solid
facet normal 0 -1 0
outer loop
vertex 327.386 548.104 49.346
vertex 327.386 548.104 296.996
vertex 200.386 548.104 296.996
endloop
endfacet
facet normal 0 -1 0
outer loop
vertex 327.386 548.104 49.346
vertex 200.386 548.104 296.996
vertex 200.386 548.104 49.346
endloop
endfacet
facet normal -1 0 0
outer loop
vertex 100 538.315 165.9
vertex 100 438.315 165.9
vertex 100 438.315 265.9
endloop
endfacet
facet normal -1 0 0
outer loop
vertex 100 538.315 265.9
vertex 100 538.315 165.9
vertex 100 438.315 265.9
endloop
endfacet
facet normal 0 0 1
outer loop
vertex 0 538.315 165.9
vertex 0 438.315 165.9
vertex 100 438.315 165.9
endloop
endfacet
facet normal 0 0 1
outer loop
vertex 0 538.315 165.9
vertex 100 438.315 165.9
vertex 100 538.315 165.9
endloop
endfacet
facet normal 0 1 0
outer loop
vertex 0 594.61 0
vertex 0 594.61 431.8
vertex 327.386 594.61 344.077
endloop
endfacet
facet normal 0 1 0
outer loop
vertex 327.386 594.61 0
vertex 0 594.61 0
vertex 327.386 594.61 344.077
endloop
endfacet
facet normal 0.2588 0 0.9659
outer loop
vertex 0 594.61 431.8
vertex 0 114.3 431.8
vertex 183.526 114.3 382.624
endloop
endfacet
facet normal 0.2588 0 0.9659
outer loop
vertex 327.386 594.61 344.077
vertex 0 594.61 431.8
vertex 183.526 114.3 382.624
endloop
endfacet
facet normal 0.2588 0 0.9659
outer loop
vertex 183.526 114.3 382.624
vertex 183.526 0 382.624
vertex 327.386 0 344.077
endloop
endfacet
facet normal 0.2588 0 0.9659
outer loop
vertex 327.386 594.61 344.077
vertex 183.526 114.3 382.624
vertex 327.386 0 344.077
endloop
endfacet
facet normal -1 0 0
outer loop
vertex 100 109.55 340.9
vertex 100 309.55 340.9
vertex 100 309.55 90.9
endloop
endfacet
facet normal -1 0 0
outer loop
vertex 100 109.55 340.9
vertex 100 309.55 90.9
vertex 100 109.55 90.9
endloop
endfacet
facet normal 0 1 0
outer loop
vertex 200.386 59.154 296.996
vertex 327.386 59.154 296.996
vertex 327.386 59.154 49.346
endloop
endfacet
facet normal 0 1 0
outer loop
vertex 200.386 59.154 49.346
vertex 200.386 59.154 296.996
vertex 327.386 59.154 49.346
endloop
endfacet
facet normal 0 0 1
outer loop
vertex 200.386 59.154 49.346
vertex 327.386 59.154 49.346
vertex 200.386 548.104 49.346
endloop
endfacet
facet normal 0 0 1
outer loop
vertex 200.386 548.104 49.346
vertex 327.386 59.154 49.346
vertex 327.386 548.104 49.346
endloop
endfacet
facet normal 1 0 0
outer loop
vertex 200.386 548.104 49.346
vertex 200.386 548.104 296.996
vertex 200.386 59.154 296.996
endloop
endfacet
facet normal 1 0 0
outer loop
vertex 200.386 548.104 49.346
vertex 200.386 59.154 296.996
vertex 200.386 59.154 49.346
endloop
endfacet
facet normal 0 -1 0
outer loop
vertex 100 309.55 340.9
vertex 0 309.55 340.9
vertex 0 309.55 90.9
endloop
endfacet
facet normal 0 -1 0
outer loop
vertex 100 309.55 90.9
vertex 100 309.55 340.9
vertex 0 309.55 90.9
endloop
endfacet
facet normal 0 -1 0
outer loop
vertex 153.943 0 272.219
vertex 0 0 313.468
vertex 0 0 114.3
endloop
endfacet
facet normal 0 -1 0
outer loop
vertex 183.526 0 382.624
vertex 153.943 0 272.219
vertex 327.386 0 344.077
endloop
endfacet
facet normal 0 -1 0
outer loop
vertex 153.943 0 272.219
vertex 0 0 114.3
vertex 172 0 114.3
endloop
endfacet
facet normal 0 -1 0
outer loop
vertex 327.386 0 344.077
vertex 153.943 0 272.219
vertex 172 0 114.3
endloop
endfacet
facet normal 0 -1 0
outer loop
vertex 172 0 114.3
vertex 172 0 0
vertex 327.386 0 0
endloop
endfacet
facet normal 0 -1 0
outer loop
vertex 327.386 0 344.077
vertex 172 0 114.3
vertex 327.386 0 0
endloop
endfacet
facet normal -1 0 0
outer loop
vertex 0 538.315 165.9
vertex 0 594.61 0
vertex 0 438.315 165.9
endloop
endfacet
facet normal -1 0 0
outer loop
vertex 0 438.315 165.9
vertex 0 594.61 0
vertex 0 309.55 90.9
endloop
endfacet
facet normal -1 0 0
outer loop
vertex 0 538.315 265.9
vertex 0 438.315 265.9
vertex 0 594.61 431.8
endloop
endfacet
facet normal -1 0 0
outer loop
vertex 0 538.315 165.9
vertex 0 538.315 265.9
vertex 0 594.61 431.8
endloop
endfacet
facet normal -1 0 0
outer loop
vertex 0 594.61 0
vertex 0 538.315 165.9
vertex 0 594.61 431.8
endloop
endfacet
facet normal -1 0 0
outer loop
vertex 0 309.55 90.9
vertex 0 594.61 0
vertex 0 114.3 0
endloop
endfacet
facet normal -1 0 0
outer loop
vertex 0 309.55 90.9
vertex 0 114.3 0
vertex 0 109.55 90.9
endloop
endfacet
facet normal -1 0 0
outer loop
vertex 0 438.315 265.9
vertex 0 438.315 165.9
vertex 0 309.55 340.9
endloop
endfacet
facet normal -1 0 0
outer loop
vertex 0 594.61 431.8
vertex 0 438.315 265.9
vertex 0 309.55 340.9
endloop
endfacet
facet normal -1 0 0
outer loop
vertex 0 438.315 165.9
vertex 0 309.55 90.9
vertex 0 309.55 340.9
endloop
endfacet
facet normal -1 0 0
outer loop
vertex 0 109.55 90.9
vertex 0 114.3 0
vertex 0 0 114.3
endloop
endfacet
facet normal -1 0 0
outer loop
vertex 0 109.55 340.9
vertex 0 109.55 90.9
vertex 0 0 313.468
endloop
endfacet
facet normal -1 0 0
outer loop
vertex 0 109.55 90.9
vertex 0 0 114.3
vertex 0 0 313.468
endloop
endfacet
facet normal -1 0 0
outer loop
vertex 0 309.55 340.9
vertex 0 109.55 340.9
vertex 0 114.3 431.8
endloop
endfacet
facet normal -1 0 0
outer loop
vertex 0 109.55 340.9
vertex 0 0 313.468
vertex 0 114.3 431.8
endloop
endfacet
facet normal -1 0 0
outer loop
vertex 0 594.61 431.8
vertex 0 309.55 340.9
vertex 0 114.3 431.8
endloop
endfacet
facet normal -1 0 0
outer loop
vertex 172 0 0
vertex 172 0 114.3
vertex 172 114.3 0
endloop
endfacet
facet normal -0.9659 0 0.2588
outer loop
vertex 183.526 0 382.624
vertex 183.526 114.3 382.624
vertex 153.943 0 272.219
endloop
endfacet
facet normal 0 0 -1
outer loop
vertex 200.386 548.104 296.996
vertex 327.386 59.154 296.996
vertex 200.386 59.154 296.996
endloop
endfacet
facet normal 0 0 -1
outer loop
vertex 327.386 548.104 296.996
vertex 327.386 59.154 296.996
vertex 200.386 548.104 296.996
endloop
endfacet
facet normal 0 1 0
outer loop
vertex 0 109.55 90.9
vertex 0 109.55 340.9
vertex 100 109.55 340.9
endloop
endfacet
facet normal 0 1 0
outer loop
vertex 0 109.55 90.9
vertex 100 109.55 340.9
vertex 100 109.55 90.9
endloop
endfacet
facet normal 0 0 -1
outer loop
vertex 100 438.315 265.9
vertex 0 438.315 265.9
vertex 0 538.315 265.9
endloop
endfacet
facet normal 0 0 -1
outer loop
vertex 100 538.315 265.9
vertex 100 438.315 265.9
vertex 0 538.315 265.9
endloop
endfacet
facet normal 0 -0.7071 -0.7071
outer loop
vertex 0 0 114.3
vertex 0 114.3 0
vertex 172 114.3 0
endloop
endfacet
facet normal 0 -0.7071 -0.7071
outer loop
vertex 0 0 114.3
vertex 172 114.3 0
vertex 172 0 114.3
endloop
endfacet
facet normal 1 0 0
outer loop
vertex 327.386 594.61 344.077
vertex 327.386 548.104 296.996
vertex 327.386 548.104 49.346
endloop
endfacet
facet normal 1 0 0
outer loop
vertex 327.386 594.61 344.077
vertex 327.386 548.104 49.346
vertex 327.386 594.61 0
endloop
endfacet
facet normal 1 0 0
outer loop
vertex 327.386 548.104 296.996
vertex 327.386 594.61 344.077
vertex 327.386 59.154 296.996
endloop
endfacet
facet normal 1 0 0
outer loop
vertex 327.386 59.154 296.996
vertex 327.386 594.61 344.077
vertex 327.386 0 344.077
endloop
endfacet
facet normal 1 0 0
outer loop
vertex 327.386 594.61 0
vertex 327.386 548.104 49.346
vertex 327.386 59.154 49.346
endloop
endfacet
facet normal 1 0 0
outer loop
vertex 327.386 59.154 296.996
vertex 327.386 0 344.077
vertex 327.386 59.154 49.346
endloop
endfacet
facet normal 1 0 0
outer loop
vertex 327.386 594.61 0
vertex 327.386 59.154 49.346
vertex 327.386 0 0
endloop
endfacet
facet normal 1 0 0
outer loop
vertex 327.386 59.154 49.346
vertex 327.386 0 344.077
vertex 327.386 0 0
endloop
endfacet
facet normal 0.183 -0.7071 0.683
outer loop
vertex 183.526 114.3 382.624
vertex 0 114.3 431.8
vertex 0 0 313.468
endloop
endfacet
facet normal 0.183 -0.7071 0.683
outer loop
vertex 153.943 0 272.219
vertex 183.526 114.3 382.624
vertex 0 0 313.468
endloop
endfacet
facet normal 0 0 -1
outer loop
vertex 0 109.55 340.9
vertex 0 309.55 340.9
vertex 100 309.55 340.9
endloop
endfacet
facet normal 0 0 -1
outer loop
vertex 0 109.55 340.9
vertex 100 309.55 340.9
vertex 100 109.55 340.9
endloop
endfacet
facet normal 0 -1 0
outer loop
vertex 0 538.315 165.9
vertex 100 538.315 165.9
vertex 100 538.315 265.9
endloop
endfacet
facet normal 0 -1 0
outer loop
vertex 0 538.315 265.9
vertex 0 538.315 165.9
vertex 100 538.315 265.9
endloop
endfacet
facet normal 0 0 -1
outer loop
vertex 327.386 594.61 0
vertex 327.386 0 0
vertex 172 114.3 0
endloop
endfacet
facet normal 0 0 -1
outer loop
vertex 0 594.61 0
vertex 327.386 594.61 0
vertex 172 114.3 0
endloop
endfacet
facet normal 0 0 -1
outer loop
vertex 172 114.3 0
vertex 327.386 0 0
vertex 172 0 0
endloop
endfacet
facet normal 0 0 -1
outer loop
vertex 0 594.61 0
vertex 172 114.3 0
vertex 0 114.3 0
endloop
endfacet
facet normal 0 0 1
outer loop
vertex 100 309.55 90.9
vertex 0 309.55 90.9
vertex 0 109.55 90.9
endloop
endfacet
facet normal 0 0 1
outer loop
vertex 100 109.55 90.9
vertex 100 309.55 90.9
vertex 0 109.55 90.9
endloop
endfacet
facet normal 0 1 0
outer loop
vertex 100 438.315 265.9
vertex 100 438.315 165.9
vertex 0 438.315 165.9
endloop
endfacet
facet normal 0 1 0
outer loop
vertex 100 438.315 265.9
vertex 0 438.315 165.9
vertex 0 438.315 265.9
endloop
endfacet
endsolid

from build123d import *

# Parameters (mm, degrees)
BOSS_EXTRUDE1_DEPTH = 594.610278
SKETCH3_W           = 247.65
SKETCH3_H           = 488.95
CUT_EXTRUDE1_DEPTH  = 127
SKETCH4_W           = 200
SKETCH4_H           = 250
CUT_EXTRUDE2_DEPTH  = 100
SKETCH5_W           = 100
SKETCH5_H           = 100
CUT_EXTRUDE3_DEPTH  = 100
CUT_EXTRUDE4_DEPTH  = 172
CUT_EXTRUDE5_DEPTH  = 190


with BuildPart() as part:
    # Sketch2 → Boss-Extrude1 (new body)
    with BuildSketch(Plane(origin=(0, 0, 0), x_dir=(1, 0, 0), z_dir=(0, 1, 0))):
        Polygon((0, -431.8), (327.385580216, -344.077298168), (327.385580216, 0), (0, 0), align=None)
    extrude(amount=BOSS_EXTRUDE1_DEPTH)

    # Sketch3 → Cut-Extrude1 (cut)
    with BuildSketch(Plane(origin=(327.385580216, 0, 0), x_dir=(0, 0, -1), z_dir=(1, 0, 0))):
        with Locations((-173.171445322, 303.629475409)):
            Rectangle(SKETCH3_W, SKETCH3_H)
    extrude(amount=-CUT_EXTRUDE1_DEPTH, mode=Mode.SUBTRACT)

    # Sketch4 → Cut-Extrude2 (cut)
    with BuildSketch(Plane(origin=(0, 0, 0), x_dir=(0, -1, 0), z_dir=(1, 0, 0))):
        with Locations((-209.55, -215.9)):
            Rectangle(SKETCH4_W, SKETCH4_H)
    extrude(amount=CUT_EXTRUDE2_DEPTH, mode=Mode.SUBTRACT)

    # Sketch5 → Cut-Extrude3 (cut)
    with BuildSketch(Plane.ZY):
        with Locations((215.9, 488.315)):
            Rectangle(SKETCH5_W, SKETCH5_H)
    extrude(amount=-CUT_EXTRUDE3_DEPTH, mode=Mode.SUBTRACT)

    # Sketch6 → Cut-Extrude4 (cut)
    with BuildSketch(Plane.ZY):
        Polygon((0, 114.3), (114.3, 0), (0, 0), align=None)
    extrude(amount=-CUT_EXTRUDE4_DEPTH, mode=Mode.SUBTRACT)

    # Sketch7 → Cut-Extrude5 (cut)
    with BuildSketch(Plane(origin=(-107.95, 0, 28.925115323), x_dir=(0, 1, 0), z_dir=(0.9659258262890691, 0, -0.258819045102518))):
        Polygon((0, 417.086771792), (114.3, 417.086771792), (0, 302.786771792), align=None)
    extrude(amount=CUT_EXTRUDE5_DEPTH, mode=Mode.SUBTRACT)


solid = part.part
